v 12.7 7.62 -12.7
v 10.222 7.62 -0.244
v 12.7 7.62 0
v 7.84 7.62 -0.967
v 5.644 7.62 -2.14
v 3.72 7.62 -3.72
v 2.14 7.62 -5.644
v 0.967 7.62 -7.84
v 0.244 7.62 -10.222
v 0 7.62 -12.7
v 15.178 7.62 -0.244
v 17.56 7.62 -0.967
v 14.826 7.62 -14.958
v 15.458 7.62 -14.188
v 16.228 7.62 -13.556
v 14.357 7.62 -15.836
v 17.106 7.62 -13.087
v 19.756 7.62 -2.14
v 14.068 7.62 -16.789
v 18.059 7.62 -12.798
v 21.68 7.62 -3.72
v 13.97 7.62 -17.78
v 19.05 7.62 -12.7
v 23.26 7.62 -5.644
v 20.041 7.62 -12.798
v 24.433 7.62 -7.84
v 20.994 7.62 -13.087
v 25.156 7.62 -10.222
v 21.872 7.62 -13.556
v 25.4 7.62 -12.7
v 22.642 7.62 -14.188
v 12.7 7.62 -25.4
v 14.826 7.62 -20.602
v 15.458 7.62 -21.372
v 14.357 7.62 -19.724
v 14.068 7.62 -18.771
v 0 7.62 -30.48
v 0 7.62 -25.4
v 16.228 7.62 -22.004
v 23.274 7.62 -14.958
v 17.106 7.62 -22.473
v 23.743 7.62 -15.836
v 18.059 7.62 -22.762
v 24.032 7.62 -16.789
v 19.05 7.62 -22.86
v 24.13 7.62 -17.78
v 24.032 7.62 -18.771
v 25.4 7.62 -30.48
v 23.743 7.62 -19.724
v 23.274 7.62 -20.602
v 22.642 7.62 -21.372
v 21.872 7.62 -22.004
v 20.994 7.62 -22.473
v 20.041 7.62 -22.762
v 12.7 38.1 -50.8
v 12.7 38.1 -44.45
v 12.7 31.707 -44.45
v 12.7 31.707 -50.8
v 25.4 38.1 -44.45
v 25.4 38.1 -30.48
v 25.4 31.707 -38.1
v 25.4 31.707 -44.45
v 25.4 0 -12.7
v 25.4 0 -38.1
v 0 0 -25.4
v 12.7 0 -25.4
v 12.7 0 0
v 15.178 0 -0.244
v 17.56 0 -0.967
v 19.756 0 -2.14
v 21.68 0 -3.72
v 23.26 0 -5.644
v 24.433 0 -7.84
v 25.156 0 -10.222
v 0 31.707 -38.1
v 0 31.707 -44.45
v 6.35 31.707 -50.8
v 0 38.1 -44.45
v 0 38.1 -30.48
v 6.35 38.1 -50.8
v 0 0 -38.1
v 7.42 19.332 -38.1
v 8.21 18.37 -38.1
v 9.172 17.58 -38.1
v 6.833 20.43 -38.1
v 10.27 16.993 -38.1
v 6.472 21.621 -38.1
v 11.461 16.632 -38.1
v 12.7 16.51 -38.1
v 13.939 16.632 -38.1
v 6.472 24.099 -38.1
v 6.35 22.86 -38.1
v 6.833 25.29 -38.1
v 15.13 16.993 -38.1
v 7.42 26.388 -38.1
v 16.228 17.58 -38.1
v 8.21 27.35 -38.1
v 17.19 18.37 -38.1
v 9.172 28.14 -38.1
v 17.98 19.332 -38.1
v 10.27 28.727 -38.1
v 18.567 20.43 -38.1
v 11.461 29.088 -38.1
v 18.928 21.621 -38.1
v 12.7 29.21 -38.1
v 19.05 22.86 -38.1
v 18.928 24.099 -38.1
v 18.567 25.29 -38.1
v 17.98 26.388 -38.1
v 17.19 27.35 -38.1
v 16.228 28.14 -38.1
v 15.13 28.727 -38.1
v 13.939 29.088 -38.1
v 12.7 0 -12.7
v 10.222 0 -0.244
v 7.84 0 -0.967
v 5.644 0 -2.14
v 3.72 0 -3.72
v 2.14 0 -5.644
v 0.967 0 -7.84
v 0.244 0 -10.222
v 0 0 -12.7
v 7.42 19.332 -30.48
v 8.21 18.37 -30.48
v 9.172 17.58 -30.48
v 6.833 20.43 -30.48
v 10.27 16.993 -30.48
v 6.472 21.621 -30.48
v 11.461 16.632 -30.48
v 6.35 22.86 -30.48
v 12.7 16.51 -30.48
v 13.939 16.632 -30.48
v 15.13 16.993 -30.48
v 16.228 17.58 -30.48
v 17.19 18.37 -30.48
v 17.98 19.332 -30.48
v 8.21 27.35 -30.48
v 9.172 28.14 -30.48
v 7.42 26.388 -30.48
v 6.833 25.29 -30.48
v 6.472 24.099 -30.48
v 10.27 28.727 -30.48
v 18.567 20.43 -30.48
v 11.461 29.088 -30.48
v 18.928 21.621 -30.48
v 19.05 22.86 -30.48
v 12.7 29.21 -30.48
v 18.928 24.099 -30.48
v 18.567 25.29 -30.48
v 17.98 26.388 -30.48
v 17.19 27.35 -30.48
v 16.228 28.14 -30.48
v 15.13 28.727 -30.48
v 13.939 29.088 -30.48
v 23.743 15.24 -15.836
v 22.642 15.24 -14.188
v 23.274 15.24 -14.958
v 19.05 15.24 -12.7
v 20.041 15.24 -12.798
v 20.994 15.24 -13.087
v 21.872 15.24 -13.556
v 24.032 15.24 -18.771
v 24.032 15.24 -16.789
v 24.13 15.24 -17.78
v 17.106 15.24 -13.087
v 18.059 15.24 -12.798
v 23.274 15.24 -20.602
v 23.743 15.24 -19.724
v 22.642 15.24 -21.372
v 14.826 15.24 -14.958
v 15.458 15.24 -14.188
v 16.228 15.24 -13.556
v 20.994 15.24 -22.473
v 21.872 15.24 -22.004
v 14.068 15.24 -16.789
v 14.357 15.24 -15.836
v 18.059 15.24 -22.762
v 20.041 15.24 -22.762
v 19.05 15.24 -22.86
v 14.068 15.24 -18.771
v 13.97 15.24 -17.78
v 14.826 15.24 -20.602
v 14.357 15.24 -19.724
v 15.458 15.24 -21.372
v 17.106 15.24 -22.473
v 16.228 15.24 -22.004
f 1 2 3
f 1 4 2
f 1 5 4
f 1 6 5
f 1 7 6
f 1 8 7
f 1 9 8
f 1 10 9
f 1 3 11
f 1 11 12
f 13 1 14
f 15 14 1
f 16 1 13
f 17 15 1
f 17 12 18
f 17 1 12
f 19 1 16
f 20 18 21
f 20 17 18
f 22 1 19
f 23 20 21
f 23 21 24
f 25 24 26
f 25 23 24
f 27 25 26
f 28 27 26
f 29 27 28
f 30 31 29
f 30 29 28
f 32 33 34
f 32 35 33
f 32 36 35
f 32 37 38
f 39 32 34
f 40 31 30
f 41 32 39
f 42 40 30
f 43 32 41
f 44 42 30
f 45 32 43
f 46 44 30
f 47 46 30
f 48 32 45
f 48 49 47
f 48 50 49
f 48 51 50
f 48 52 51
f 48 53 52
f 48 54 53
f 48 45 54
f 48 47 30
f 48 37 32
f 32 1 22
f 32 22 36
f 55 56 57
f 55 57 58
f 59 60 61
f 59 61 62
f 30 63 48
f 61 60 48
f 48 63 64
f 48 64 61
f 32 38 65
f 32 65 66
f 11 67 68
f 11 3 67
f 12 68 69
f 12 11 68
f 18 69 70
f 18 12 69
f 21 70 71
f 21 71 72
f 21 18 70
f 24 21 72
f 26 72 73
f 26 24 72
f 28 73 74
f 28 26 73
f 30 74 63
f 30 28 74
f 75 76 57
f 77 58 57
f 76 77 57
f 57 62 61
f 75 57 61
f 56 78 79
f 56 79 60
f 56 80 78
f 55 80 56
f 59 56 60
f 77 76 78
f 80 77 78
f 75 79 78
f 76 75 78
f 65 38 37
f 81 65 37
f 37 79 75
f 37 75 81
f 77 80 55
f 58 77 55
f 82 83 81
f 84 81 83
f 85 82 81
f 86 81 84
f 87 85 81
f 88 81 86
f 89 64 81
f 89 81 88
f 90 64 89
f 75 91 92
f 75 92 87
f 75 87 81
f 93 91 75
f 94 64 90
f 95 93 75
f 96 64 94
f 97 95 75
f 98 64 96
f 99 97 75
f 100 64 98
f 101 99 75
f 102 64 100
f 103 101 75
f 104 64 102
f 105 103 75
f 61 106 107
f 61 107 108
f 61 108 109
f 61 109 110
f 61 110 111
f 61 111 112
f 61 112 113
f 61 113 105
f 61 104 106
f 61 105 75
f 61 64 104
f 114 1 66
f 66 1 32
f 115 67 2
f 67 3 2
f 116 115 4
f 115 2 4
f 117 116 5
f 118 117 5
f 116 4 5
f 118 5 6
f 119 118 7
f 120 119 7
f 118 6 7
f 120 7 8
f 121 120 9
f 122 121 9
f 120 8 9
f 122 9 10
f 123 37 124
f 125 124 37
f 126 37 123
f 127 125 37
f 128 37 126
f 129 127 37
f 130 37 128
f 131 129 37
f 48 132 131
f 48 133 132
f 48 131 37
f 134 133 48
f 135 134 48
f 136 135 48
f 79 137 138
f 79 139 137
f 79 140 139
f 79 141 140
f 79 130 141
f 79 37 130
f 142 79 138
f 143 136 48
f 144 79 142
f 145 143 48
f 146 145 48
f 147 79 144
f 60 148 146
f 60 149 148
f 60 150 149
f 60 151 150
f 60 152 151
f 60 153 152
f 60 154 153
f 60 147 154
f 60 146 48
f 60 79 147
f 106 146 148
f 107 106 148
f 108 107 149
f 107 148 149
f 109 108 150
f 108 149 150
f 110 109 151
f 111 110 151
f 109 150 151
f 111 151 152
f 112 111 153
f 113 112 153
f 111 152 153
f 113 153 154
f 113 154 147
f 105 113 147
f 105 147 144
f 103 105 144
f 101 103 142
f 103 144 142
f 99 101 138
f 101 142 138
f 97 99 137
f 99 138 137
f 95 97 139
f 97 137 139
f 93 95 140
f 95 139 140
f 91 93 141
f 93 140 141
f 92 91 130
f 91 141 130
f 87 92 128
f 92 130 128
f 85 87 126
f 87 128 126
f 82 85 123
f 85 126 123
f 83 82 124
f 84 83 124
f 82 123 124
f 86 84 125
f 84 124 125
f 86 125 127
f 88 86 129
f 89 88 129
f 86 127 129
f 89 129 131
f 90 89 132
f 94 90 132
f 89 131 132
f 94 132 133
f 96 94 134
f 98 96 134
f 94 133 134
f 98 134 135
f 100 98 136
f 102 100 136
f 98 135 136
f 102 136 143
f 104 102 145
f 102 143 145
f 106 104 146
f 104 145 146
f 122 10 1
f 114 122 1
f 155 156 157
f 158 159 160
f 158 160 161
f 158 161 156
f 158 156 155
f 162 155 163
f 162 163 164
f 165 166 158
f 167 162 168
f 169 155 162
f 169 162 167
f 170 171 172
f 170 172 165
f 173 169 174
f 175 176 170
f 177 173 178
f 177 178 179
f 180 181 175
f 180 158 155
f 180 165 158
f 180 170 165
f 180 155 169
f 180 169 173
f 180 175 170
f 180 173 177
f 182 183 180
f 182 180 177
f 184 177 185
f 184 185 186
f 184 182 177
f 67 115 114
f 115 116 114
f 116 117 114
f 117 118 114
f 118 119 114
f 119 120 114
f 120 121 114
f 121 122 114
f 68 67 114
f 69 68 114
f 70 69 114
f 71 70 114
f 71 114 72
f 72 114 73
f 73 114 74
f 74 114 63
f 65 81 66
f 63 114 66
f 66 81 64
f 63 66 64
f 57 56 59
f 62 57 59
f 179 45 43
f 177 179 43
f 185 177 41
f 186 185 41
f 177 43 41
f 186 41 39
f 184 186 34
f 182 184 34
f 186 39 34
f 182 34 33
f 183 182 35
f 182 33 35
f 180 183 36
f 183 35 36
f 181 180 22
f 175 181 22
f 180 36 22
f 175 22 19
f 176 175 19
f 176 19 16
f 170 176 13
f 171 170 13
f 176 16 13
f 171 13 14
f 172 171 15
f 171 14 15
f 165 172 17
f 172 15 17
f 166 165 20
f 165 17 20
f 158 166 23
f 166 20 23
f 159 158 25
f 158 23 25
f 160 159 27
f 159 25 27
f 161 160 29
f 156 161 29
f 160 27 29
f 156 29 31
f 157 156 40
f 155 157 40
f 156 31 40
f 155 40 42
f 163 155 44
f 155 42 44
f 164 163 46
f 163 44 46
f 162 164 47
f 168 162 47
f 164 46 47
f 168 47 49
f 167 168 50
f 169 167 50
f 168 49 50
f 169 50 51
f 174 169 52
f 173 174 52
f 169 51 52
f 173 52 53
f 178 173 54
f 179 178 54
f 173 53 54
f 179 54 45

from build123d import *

# Parameters (mm, degrees)
SKETCH1_W               = 25.4
SKETCH1_H               = 50.8
BOSS_EXTRUDE1_DEPTH     = 38.1
SKETCH2_W               = 25.4
SKETCH2_H               = 30.48
CUT_EXTRUDE1_DEPTH      = 30.48
CUT_EXTRUDE2_DEPTH      = 10.668
CUT_EXTRUDE2_DEPTH_BACK = 32.258
SKETCH3_W               = 12.7
SKETCH3_H               = 31.706835607
SKETCH4_W               = 12.7
SKETCH4_H               = 6.35
CUT_EXTRUDE3_DEPTH      = 32.258
CHAMFER1_SIZE           = 6.35
FILLET1_R               = 12.7
FILLET2_R               = 12.7
SKETCH8_R               = 5.08
BOSS_EXTRUDE3_DEPTH     = 7.62
SKETCH9_R               = 6.35
CUT_EXTRUDE6_DEPTH      = 7.62
SKETCH10_W              = 12.7
SKETCH10_H              = 12.7
CUT_EXTRUDE7_DEPTH      = 7.62


with BuildPart() as part:
    # Sketch1 → Boss-Extrude1 (new body)
    with BuildSketch(Plane(origin=(0, 0, 0), x_dir=(1, 0, 0), z_dir=(0, 1, 0))):
        with Locations((12.7, 25.4)):
            Rectangle(SKETCH1_W, SKETCH1_H)
    extrude(amount=BOSS_EXTRUDE1_DEPTH)

    # Sketch2 → Cut-Extrude1 (cut)
    with BuildSketch(Plane(origin=(0, 38.1, 0), x_dir=(1, 0, 0), z_dir=(0, 1, 0))):
        with Locations((12.7, 15.24)):
            Rectangle(SKETCH2_W, SKETCH2_H)
    extrude(amount=-CUT_EXTRUDE1_DEPTH, mode=Mode.SUBTRACT)

    # Sketch3 → Cut-Extrude2 (cut, two sides: drawn at the far end of the back side and taken through both)
    with BuildSketch(Plane.ZY.offset(-CUT_EXTRUDE2_DEPTH_BACK)):
        with Locations((-44.45, 15.853417804)):
            Rectangle(SKETCH3_W, SKETCH3_H)
    extrude(amount=CUT_EXTRUDE2_DEPTH + CUT_EXTRUDE2_DEPTH_BACK, mode=Mode.SUBTRACT)

    # Sketch4 → Cut-Extrude3 (cut)
    with BuildSketch(Plane(origin=(0, 38.1, 0), x_dir=(1, 0, 0), z_dir=(0, 1, 0))):
        with Locations((19.05, 47.625)):
            Rectangle(SKETCH4_W, SKETCH4_H)
    extrude(amount=-CUT_EXTRUDE3_DEPTH, mode=Mode.SUBTRACT)

    # Chamfer1
    chamfer1_edges = [part.edges().sort_by_distance(p)[0] for p in [
        (0, 34.903417804, -50.8),
    ]]
    chamfer(chamfer1_edges, length=CHAMFER1_SIZE)

    # Fillet1
    fillet1_edges = [part.edges().sort_by_distance(p)[0] for p in [
        (25.4, 3.81, 0),
    ]]
    fillet(fillet1_edges, radius=FILLET1_R)

    # Fillet2
    fillet2_edges = [part.edges().sort_by_distance(p)[0] for p in [
        (0, 3.81, 0),
    ]]
    fillet(fillet2_edges, radius=FILLET2_R - 0.0001)  # a hair under: the kernel refuses the full size

    # Sketch8 → Boss-Extrude3 (add)
    with BuildSketch(Plane(origin=(0, 7.62, 0), x_dir=(1, 0, 0), z_dir=(0, 1, 0))):
        with Locations(Location((19.05, 17.78, 0), (0, 0, 90))):
            Circle(SKETCH8_R)
    extrude(amount=BOSS_EXTRUDE3_DEPTH)

    # Sketch9 → Cut-Extrude6 (cut)
    with BuildSketch(Plane.XY.offset(-30.48)):
        with Locations((12.7, 22.86)):
            Circle(SKETCH9_R)
    extrude(amount=-CUT_EXTRUDE6_DEPTH, mode=Mode.SUBTRACT)

    # Sketch10 → Cut-Extrude7 (cut)
    with BuildSketch(Plane(origin=(0, 7.62, 0), x_dir=(1, 0, 0), z_dir=(0, 1, 0))):
        with Locations((6.35, 19.05)):
            Rectangle(SKETCH10_W, SKETCH10_H)
    extrude(amount=-CUT_EXTRUDE7_DEPTH, mode=Mode.SUBTRACT)


solid = part.part
